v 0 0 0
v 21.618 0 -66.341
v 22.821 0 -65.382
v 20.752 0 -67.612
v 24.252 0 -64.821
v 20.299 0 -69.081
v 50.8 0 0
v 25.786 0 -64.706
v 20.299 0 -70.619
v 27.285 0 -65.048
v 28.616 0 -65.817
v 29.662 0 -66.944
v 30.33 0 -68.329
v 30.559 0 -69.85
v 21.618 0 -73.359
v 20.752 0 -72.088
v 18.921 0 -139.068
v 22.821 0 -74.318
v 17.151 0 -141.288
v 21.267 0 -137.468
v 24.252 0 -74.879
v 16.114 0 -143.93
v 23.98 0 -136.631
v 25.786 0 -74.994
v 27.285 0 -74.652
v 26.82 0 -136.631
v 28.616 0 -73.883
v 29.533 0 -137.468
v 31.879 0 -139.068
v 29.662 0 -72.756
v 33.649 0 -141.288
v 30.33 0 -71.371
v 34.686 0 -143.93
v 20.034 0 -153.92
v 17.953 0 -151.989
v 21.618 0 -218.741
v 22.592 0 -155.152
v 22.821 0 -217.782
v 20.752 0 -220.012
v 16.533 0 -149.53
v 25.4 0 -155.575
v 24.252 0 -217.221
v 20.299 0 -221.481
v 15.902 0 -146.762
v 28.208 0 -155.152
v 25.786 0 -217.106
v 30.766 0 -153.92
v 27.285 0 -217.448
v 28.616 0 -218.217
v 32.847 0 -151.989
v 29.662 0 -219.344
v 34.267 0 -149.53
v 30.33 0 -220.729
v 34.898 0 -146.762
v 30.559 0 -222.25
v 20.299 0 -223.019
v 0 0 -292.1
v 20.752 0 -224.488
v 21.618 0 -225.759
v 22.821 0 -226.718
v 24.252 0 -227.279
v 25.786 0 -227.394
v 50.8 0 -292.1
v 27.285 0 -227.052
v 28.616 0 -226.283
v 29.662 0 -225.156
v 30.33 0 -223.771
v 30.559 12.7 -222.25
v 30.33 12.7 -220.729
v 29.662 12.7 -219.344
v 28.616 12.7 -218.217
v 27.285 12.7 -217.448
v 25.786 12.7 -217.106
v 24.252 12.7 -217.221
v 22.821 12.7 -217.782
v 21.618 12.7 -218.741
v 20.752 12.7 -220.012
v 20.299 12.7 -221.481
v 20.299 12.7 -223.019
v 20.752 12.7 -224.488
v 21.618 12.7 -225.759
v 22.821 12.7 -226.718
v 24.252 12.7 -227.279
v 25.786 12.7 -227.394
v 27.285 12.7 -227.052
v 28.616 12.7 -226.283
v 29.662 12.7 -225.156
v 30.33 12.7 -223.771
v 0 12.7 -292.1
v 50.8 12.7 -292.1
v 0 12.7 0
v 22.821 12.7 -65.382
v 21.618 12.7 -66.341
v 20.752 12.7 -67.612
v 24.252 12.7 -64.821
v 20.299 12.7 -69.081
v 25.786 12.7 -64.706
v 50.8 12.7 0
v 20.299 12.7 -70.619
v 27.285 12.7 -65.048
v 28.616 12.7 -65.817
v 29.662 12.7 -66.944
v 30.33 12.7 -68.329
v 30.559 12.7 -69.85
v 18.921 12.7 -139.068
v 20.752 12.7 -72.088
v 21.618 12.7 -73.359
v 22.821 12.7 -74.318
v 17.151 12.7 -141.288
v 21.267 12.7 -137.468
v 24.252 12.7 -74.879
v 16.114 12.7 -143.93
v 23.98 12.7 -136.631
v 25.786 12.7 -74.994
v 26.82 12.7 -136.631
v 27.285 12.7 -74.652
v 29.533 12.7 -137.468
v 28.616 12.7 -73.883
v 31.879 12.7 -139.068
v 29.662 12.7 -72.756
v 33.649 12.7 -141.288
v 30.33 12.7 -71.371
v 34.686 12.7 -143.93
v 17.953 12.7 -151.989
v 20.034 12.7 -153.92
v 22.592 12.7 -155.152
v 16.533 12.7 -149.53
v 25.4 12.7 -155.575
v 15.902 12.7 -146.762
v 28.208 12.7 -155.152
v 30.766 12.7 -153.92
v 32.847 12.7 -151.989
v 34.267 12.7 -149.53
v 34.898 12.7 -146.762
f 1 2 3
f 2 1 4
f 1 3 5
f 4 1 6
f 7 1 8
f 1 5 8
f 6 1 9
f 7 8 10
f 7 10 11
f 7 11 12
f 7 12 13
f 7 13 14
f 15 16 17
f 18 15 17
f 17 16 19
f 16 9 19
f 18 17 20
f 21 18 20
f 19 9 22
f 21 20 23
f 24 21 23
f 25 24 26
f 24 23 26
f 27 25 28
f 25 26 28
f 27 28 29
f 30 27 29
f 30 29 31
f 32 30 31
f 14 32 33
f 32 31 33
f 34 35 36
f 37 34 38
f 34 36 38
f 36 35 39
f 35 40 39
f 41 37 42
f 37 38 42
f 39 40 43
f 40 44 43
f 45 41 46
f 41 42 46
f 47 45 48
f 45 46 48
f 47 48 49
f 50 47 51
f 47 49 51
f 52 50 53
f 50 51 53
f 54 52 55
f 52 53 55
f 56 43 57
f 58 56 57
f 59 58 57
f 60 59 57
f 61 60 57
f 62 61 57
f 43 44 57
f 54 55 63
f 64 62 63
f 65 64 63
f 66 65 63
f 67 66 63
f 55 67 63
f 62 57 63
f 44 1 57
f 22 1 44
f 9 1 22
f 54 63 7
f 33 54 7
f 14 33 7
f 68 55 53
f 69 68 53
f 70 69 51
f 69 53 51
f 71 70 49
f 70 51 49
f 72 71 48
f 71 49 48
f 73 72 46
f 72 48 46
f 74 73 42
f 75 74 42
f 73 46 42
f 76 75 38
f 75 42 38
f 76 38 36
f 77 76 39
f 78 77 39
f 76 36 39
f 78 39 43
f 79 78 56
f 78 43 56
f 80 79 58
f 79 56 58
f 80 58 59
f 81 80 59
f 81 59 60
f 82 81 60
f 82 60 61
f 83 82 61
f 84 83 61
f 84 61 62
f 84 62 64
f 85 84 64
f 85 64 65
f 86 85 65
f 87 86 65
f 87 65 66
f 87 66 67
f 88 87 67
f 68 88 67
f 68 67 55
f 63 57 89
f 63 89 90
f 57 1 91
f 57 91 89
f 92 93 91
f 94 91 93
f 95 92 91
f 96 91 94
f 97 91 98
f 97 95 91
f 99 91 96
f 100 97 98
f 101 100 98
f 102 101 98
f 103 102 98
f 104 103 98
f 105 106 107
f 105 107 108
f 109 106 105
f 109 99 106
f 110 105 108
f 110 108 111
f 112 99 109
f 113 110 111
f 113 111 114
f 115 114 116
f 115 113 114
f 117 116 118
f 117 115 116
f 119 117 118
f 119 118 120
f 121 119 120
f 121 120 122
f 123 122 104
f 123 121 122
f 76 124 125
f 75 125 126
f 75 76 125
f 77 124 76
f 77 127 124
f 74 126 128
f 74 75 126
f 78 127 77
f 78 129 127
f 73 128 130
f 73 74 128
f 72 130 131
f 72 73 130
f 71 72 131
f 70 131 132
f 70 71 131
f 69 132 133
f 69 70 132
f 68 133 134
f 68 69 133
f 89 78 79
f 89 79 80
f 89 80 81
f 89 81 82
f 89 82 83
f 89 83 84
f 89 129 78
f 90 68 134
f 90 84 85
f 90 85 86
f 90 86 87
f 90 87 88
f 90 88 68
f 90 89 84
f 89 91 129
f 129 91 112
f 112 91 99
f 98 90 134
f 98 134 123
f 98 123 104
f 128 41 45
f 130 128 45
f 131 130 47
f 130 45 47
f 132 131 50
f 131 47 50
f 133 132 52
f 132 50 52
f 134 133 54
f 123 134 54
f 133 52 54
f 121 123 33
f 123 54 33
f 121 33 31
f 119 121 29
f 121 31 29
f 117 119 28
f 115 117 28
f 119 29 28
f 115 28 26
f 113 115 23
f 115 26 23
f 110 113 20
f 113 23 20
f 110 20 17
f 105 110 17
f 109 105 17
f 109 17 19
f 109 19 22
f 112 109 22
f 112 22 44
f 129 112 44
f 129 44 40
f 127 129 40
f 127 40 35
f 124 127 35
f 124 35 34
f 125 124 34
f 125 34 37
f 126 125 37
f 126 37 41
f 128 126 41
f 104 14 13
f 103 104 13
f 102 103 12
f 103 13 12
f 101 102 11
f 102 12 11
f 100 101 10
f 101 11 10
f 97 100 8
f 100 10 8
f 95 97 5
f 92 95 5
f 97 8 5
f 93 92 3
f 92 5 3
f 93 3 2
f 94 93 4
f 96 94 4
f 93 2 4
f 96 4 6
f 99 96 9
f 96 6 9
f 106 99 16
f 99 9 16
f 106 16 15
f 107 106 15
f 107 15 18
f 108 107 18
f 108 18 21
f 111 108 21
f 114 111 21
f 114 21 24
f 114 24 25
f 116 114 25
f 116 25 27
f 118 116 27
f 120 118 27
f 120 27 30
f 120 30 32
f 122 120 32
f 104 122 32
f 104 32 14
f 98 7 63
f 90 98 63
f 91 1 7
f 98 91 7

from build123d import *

# Parameters (mm, degrees)
SKETCH1_W               = 50.8
SKETCH1_H               = 292.1
EXTRUDE1_DEPTH          = 12.7
F_3_8_CLEARANCE_HOLE1_D = 10.31748
SKETCH4_R               = 9.525
CUT_EXTRUDE1_DEPTH      = 297.756364717


with BuildPart() as part:
    # Sketch1 → Extrude1 (new body)
    with BuildSketch(Plane(origin=(0, 0, 0), x_dir=(1, 0, 0), z_dir=(0, 1, 0))):
        with Locations((25.4, 146.05)):
            Rectangle(SKETCH1_W, SKETCH1_H)
    extrude(amount=EXTRUDE1_DEPTH)

    # 3/8 Clearance Hole1 (through all)
    with Locations(Plane(origin=(0, 12.7, 0), x_dir=(-1, 0, 0), z_dir=(0, 1, 0))):
        with Locations((-25.4, -69.85), (-25.4, -222.25)):
            Hole(F_3_8_CLEARANCE_HOLE1_D / 2)

    # Sketch4 → Cut-Extrude1 (cut, through all)
    with BuildSketch(Plane.XZ):
        with Locations(Location((25.4, -146.05, 0), (0, 0, 270))):
            Circle(SKETCH4_R)
    extrude(amount=-CUT_EXTRUDE1_DEPTH, mode=Mode.SUBTRACT)


solid = part.part
